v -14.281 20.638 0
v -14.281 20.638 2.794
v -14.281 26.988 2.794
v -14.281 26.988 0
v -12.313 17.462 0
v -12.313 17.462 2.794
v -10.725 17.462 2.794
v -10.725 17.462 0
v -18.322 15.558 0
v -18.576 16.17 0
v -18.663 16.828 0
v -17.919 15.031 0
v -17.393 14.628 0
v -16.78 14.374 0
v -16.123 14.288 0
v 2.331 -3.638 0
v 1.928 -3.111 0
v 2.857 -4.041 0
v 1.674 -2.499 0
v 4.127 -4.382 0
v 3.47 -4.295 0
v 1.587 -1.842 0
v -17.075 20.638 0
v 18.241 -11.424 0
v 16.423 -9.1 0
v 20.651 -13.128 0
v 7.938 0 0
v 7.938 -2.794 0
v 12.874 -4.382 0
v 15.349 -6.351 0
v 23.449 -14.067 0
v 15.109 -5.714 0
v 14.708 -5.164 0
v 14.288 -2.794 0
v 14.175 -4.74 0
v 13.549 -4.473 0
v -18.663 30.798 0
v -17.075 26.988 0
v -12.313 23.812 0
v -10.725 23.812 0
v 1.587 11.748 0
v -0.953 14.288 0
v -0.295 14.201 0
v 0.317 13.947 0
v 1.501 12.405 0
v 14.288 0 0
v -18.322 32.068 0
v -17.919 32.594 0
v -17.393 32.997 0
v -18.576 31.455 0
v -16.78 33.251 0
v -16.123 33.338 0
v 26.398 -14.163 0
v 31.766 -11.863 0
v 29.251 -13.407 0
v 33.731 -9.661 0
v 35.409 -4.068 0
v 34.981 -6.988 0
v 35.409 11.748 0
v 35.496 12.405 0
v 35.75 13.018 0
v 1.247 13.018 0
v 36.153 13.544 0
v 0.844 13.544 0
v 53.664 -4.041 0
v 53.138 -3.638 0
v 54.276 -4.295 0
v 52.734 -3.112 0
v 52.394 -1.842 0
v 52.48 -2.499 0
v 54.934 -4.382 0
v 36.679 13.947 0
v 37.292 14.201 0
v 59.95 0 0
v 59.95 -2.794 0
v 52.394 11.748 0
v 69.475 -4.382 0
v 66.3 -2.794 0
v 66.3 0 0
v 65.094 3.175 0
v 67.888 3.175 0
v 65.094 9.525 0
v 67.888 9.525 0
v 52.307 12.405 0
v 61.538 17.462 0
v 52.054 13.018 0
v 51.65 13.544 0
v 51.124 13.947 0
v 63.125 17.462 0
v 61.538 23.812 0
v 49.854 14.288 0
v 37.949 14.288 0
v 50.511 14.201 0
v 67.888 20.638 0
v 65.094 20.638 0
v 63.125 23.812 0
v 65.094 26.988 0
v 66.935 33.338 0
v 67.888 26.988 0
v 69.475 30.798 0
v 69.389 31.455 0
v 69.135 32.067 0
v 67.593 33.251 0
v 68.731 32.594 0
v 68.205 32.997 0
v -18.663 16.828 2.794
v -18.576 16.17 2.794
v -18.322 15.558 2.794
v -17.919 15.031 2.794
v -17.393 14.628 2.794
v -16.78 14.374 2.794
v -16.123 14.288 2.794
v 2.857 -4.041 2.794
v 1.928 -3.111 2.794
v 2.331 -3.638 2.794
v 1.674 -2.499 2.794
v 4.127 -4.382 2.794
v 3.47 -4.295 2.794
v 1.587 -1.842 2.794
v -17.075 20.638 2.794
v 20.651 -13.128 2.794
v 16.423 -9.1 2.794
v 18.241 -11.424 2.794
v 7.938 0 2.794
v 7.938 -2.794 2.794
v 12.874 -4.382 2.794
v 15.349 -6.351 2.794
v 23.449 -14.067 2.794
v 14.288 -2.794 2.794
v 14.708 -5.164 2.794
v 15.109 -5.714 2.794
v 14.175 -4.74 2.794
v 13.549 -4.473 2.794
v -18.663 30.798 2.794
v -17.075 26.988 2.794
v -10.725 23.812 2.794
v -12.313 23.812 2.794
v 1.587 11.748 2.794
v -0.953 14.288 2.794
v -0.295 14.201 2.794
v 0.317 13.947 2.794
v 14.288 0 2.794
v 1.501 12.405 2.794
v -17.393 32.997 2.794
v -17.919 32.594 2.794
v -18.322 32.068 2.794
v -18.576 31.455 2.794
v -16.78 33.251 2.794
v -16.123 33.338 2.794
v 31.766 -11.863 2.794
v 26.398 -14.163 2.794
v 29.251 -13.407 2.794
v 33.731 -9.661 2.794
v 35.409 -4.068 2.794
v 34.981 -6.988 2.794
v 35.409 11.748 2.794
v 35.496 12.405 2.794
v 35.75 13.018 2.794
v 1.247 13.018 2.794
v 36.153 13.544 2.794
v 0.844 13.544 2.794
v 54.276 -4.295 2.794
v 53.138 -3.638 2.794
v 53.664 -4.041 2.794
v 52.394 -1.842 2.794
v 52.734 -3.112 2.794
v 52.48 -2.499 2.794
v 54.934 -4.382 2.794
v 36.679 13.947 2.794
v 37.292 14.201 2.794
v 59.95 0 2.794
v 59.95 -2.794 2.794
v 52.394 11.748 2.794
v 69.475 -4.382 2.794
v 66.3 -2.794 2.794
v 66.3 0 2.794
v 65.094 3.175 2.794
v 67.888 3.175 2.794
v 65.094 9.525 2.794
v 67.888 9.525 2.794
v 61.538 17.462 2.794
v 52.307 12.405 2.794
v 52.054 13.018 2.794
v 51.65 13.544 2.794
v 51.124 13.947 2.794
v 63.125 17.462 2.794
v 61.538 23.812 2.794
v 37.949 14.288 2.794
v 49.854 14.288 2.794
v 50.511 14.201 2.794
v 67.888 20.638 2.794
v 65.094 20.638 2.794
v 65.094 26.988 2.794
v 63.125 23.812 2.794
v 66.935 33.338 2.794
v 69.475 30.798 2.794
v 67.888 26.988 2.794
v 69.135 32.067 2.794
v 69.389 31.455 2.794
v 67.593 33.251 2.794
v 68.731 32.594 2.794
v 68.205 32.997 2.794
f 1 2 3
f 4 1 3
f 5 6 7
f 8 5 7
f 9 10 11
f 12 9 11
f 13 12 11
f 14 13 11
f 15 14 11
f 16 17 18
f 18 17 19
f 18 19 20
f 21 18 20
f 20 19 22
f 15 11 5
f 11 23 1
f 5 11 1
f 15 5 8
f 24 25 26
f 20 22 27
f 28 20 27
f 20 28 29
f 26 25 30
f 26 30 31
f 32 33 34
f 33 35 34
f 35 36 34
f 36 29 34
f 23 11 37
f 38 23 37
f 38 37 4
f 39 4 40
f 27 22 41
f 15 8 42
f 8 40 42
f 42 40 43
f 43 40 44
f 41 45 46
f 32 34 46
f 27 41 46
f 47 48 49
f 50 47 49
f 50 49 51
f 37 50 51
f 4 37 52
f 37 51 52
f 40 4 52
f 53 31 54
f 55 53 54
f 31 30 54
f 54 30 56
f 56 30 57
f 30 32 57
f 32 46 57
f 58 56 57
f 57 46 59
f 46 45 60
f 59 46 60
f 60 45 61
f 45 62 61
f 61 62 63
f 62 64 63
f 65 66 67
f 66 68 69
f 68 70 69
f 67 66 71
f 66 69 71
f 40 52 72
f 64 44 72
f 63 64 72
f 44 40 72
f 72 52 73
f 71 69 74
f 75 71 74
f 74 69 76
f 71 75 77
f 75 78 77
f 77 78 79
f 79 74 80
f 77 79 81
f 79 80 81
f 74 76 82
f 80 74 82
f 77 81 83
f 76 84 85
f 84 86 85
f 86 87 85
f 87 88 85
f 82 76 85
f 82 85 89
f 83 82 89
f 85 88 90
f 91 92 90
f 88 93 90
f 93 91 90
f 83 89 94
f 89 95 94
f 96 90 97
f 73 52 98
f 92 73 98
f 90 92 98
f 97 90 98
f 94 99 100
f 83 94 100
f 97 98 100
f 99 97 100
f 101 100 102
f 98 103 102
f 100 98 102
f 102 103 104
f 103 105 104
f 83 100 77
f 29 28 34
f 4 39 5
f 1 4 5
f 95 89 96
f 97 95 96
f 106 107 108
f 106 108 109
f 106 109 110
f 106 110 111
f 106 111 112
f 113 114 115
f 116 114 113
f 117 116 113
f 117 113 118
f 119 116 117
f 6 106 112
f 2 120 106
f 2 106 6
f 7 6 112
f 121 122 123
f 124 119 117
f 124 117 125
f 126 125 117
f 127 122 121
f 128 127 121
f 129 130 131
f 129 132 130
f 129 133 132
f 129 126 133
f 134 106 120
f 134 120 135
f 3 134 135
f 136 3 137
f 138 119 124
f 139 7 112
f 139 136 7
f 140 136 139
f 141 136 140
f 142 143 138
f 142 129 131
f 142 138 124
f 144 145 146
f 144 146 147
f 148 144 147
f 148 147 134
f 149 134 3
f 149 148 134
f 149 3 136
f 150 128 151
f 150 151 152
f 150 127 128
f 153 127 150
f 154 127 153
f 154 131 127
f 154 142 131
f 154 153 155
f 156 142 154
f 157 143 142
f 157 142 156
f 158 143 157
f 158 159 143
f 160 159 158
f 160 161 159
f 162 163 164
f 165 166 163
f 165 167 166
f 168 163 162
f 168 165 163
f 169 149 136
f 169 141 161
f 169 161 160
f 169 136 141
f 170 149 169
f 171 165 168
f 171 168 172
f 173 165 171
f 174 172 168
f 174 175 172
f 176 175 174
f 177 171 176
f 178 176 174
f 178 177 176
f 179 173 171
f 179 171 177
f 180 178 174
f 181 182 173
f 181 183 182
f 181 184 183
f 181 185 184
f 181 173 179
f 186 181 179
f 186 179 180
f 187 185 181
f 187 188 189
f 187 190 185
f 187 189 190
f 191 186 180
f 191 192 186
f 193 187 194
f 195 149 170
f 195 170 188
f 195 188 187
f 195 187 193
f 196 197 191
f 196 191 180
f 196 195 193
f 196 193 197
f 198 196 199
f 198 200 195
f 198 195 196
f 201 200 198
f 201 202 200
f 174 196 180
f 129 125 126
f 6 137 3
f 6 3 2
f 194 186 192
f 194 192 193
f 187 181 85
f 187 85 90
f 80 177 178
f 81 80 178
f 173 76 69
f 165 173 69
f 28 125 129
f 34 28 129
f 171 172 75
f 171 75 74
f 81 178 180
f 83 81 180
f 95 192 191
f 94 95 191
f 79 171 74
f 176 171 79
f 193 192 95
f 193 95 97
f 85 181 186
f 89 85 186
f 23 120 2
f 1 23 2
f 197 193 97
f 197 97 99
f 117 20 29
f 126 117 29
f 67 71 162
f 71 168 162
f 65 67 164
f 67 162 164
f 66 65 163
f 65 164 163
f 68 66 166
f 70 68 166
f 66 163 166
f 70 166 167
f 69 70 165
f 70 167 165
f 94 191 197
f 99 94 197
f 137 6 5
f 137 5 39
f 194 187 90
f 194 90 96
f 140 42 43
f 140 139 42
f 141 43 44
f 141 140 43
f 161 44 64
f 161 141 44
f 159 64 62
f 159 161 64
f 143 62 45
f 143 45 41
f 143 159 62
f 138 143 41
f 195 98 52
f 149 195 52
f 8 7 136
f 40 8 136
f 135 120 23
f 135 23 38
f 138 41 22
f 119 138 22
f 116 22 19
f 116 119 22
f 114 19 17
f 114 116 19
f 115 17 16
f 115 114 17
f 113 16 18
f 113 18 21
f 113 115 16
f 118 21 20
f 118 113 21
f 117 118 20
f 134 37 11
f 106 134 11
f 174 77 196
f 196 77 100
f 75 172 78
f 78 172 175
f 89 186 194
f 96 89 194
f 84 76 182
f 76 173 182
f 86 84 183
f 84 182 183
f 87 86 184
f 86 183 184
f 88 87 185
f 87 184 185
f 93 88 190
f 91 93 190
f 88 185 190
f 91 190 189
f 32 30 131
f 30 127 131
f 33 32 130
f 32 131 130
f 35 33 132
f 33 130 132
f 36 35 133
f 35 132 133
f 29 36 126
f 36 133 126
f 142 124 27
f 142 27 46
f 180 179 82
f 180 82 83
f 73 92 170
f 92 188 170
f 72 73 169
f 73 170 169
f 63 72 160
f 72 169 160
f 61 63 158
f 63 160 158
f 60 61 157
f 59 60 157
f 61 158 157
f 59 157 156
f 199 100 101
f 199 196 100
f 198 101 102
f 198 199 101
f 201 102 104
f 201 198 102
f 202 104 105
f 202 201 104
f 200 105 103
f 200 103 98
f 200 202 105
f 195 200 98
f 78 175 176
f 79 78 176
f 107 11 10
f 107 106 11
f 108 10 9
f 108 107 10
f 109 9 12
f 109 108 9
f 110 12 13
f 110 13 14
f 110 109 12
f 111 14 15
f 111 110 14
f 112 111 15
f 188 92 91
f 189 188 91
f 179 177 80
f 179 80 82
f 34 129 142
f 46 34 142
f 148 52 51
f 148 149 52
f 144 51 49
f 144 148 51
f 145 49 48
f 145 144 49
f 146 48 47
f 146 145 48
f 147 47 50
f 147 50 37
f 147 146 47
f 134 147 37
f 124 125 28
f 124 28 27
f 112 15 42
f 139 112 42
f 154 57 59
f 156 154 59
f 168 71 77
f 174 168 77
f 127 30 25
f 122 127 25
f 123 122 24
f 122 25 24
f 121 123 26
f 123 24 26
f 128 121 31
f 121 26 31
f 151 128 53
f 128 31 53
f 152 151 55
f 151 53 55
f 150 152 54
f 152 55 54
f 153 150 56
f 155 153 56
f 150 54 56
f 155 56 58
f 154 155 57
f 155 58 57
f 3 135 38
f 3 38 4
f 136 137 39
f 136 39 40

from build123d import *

# Parameters (mm, degrees)
BOSS_EXTRUDE1_DEPTH = 2.794
SKETCH3_W           = 2.794
SKETCH3_H           = 6.35
SKETCH3_W_2         = 1.5875
SKETCH3_W_3         = 6.35
SKETCH3_H_2         = 2.794
CUT_EXTRUDE1_DEPTH  = 78.110446656
FILLET1_R           = 2.54


with BuildPart() as part:
    # Sketch1 → Boss-Extrude1 (new body)
    with BuildSketch(Plane.XY):
        with BuildLine():
            Line((69.475359958, -4.3815), (69.475359958, 33.3375))
            Line((69.475359958, 33.3375), (-18.662640042, 33.3375))
            Line((-18.662640042, 33.3375), (-18.662640042, 14.2875))
            Line((-18.662640042, 14.2875), (1.5875, 14.2875))
            Line((1.5875, 14.2875), (1.5875, -4.3815))
            Line((1.5875, -4.3815), (15.094335312, -4.3815))
            ThreePointArc((15.094335312, -4.3815), (25.406359958, -14.226588915), (35.409491259, -4.0678))
            Line((35.409491259, -4.0678), (35.409491259, 14.2875))
            Line((35.409491259, 14.2875), (52.393859958, 14.2875))
            Line((52.393859958, 14.2875), (52.393859958, -4.3815))
            Line((52.393859958, -4.3815), (69.475359958, -4.3815))
        make_face()
    extrude(amount=BOSS_EXTRUDE1_DEPTH)

    # Sketch3 → Cut-Extrude1 (cut, through all)
    with BuildSketch(Plane.XY.offset(2.794)):
        with Locations((-15.678140042, 23.8125)):
            Rectangle(SKETCH3_W, SKETCH3_H)
        with Locations((66.490859958, 23.8125)):
            Rectangle(SKETCH3_W, SKETCH3_H)
        with Locations((66.490859958, 6.35)):
            Rectangle(SKETCH3_W, SKETCH3_H)
        with Locations((-11.518890042, 20.6375)):
            Rectangle(SKETCH3_W_2, SKETCH3_H)
        with Locations((62.331609958, 20.6375)):
            Rectangle(SKETCH3_W_2, SKETCH3_H)
        with Locations((11.1125, -1.397)):
            Rectangle(SKETCH3_W_3, SKETCH3_H_2)
        with Locations((63.125359958, -1.397)):
            Rectangle(SKETCH3_W_3, SKETCH3_H_2)
    extrude(amount=-CUT_EXTRUDE1_DEPTH, mode=Mode.SUBTRACT)

    # Fillet1
    fillet1_edges = [part.edges().sort_by_distance(p)[0] for p in [
        (52.393859958, -4.3815, 1.397),
        (52.393859958, 14.2875, 1.397),
        (35.409491259, 14.2875, 1.397),
        (15.094335312, -4.3815, 1.397),
        (1.5875, -4.3815, 1.397),
        (1.5875, 14.2875, 1.397),
        (-18.662640042, 14.2875, 1.397),
        (-18.662640042, 33.3375, 1.397),
        (69.475359958, 33.3375, 1.397),
    ]]
    fillet(fillet1_edges, radius=FILLET1_R)


solid = part.part
